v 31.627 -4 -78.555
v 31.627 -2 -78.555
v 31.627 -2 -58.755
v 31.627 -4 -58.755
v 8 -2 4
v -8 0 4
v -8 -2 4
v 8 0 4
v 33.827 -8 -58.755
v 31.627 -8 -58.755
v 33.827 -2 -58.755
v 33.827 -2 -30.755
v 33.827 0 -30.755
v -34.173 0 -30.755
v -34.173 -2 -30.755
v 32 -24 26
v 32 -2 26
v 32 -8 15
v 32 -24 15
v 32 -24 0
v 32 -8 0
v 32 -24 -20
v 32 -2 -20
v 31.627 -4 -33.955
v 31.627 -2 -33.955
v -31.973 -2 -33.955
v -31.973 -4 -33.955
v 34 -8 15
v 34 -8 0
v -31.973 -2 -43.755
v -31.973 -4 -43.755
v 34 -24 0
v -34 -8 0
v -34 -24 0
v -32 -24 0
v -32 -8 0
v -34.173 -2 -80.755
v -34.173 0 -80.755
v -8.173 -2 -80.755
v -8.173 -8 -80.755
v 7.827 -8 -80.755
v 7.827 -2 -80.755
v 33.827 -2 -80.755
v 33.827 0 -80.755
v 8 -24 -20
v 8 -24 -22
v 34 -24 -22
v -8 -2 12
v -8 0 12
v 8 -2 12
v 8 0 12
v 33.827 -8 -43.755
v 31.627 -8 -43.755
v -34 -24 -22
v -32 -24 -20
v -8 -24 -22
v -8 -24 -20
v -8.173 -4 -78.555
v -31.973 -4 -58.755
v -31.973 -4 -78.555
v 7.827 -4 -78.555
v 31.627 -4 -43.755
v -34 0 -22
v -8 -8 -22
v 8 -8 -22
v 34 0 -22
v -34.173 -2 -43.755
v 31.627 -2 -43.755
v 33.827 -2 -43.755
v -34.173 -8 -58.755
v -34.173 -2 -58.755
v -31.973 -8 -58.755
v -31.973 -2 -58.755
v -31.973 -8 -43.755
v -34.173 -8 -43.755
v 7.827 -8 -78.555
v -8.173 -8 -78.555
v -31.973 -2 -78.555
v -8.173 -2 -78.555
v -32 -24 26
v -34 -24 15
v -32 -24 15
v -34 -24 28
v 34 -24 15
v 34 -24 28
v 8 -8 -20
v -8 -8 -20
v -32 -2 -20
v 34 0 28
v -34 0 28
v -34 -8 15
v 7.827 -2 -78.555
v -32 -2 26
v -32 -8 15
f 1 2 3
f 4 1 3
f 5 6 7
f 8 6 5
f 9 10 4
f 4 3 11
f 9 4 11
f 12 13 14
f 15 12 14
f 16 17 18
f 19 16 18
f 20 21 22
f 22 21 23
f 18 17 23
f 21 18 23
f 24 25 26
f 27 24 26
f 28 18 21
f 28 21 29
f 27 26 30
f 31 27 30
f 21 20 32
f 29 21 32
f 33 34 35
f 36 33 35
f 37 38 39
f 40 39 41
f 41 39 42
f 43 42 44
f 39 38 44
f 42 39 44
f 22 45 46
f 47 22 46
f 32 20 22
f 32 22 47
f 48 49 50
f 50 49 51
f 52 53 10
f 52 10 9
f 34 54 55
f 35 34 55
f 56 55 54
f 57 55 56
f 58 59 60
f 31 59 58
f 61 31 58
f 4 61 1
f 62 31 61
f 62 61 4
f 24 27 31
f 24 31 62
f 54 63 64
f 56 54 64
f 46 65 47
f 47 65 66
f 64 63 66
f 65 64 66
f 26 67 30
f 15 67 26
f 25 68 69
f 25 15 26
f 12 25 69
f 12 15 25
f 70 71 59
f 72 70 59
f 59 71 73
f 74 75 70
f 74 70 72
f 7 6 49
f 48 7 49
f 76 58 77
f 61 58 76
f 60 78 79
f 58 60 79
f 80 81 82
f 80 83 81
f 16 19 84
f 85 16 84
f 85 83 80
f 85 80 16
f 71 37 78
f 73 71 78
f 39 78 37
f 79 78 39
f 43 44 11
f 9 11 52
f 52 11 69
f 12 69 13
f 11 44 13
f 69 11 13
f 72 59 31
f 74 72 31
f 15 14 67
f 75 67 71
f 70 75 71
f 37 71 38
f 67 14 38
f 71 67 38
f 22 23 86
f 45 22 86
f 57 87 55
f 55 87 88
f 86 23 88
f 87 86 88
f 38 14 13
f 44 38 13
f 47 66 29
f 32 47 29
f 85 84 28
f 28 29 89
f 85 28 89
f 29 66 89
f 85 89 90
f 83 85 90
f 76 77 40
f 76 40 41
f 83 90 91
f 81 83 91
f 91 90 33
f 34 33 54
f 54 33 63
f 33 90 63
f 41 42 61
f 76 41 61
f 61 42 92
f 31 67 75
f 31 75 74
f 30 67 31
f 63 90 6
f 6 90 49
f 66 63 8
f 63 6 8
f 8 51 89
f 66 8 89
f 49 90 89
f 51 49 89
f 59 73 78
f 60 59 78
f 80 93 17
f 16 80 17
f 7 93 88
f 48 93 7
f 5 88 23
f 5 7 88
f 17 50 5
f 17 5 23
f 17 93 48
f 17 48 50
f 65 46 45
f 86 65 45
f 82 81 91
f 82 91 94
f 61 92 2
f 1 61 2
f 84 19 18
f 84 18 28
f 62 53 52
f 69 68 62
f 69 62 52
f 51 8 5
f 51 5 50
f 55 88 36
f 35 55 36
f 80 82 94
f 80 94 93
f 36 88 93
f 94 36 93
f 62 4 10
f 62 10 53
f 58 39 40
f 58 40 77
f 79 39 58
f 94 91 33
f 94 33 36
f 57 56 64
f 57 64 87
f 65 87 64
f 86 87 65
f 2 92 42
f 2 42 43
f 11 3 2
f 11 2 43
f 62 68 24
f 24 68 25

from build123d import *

# Parameters (mm, degrees)
F0_W     = 16
F0_H     = 8
F0_W_2   = 2
F0_H_2   = 15
F0_H_3   = 2
F1_DEPTH = 2
F2_DEPTH = 24
F3_START = 8
F3_DEPTH = 16
F0_W_3   = 2.2
F0_H_4   = 2.2
F4_DEPTH = 2
F5_DEPTH = 4
F6_DEPTH = 8


with BuildPart() as f1:
    # F0 (on Front) → F1 (new body)
    with BuildSketch(Plane.XZ):
        Polygon((-32, 26), (-32, 15), (-32, 0), (-32, -20), (-8, -20), (8, -20), (32, -20), (32, 0), (32, 15), (32, 26), align=None)
        with Locations((0, 8)):
            Rectangle(F0_W, F0_H, mode=Mode.SUBTRACT)
        with Locations((33, 7.5)):
            Rectangle(F0_W_2, F0_H_2)
        Polygon((34, -22), (34, 0), (32, 0), (32, -20), (8, -20), (8, -22), align=None)
        Polygon((34, 28), (-34, 28), (-34, 15), (-32, 15), (-32, 26), (32, 26), (32, 15), (34, 15), align=None)
        with Locations((-33, 7.5)):
            Rectangle(F0_W_2, F0_H_2)
        Polygon((-32, 0), (-34, 0), (-34, -22), (-8, -22), (-8, -20), (-32, -20), align=None)
        with Locations((0, -21)):
            Rectangle(F0_W, F0_H_3)
    extrude(amount=F1_DEPTH)

    # F0 (on Front) → F2 (join)
    with BuildSketch(Plane.XZ):
        with Locations((0, -21)):
            Rectangle(F0_W, F0_H_3)
        Polygon((-32, 0), (-34, 0), (-34, -22), (-8, -22), (-8, -20), (-32, -20), align=None)
        with Locations((-33, 7.5)):
            Rectangle(F0_W_2, F0_H_2)
        Polygon((34, -22), (34, 0), (32, 0), (32, -20), (8, -20), (8, -22), align=None)
        with Locations((33, 7.5)):
            Rectangle(F0_W_2, F0_H_2)
        Polygon((34, 28), (-34, 28), (-34, 15), (-32, 15), (-32, 26), (32, 26), (32, 15), (34, 15), align=None)
    extrude(amount=F2_DEPTH)

    # F0 (on Front) → F3 (cut)
    with BuildSketch(Plane.XZ.offset(F3_START)):
        with Locations((-33, 7.5)):
            Rectangle(F0_W_2, F0_H_2)
        with Locations((0, -21)):
            Rectangle(F0_W, F0_H_3)
        with Locations((33, 7.5)):
            Rectangle(F0_W_2, F0_H_2)
    extrude(amount=F3_DEPTH, mode=Mode.SUBTRACT)


with BuildPart() as f4:
    # F0 (on Front) → F4 (new body)
    with BuildSketch(Plane.XZ):
        Polygon((-31.9727845669, -33.9552039623), (-31.9727845669, -43.7552039623), (-31.9727845669, -58.7552039623), (-31.9727845669, -78.5552039623), (-8.1727845669, -78.5552039623), (7.8272154331, -78.5552039623), (31.6272154331, -78.5552039623), (31.6272154331, -58.7552039623), (31.6272154331, -43.7552039623), (31.6272154331, -33.9552039623), align=None)
        Polygon((33.8272154331, -30.7552039623), (-34.1727845669, -30.7552039623), (-34.1727845669, -43.7552039623), (-31.9727845669, -43.7552039623), (-31.9727845669, -33.9552039623), (31.6272154331, -33.9552039623), (31.6272154331, -43.7552039623), (33.8272154331, -43.7552039623), align=None)
        with Locations((-33.0727845669, -51.2552039623)):
            Rectangle(F0_W_3, F0_H_2)
        Polygon((-31.9727845669, -58.7552039623), (-34.1727845669, -58.7552039623), (-34.1727845669, -80.7552039623), (-8.1727845669, -80.7552039623), (-8.1727845669, -78.5552039623), (-31.9727845669, -78.5552039623), align=None)
        with Locations((-0.1727845669, -79.6552039623)):
            Rectangle(F0_W, F0_H_4)
        Polygon((33.8272154331, -80.7552039623), (33.8272154331, -58.7552039623), (31.6272154331, -58.7552039623), (31.6272154331, -78.5552039623), (7.8272154331, -78.5552039623), (7.8272154331, -80.7552039623), align=None)
        with Locations((32.7272154331, -51.2552039623)):
            Rectangle(F0_W_3, F0_H_2)
    extrude(amount=F4_DEPTH)

    # F0 (on Front) → F5 (join)
    with BuildSketch(Plane.XZ):
        Polygon((-31.9727845669, -33.9552039623), (-31.9727845669, -43.7552039623), (-31.9727845669, -58.7552039623), (-31.9727845669, -78.5552039623), (-8.1727845669, -78.5552039623), (7.8272154331, -78.5552039623), (31.6272154331, -78.5552039623), (31.6272154331, -58.7552039623), (31.6272154331, -43.7552039623), (31.6272154331, -33.9552039623), align=None)
    extrude(amount=F5_DEPTH)

    # F0 (on Front) → F6 (join)
    with BuildSketch(Plane.XZ):
        with Locations((-33.0727845669, -51.2552039623)):
            Rectangle(F0_W_3, F0_H_2)
        with Locations((-0.1727845669, -79.6552039623)):
            Rectangle(F0_W, F0_H_4)
        with Locations((32.7272154331, -51.2552039623)):
            Rectangle(F0_W_3, F0_H_2)
    extrude(amount=F6_DEPTH)


solid = Compound([f1.part, f4.part])
